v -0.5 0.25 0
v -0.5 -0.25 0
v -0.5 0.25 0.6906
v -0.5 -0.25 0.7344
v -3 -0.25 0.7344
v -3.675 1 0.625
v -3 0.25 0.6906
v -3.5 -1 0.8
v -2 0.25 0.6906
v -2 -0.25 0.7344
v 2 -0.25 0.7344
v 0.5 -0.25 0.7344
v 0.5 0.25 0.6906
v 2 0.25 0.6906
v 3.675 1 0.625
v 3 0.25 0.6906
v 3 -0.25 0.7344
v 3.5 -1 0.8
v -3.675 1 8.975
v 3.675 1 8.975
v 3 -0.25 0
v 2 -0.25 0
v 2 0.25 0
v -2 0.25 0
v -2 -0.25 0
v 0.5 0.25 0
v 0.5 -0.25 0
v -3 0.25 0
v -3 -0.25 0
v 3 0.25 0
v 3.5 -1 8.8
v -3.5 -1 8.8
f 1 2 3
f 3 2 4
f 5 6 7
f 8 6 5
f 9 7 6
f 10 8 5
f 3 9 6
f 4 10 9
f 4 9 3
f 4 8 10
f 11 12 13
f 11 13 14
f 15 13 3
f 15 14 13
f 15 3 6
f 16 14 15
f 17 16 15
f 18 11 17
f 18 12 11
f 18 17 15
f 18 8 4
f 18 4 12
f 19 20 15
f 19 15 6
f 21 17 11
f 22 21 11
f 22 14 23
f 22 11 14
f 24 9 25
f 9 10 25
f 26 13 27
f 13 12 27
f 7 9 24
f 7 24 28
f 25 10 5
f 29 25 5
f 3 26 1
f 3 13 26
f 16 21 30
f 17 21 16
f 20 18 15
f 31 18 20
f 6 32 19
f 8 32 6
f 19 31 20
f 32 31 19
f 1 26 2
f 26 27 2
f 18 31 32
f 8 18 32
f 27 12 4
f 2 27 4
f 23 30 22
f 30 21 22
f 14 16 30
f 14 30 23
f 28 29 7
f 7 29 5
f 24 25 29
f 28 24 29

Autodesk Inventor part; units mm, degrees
ref_plane "YZ Plane" through (0, 0, 0) normal (1, 0, 0) x (0, 1, 0)
ref_plane "XZ Plane" through (0, 0, 0) normal (0, 1, 0) x (-1, 0, 0)
ref_plane "XY Plane" through (0, 0, 0) normal (0, 0, 1) x (1, 0, 0)
sketch "Sketch2" plane through (0, 0, 0) normal (0, 1, 0) x (-1, 0, 0)
  line L0 (0, -0.1) -> (0, 1.3) projected
  line L1 (-4.8, 0) -> (3.6, 0) projected
  line L2 (-0.5, 0) -> (0.5, 0)
  line L3 (0.5, 0) -> (0.5, 1)
  line L4 (0.5, 1) -> (-0.5, 1)
  line L5 (-0.5, 1) -> (-0.5, 0)
  line L6 (2, 0) -> (3, 0)
  line L7 (3, 0) -> (3, 1)
  line L8 (3, 1) -> (2, 1)
  line L9 (2, 1) -> (2, 0)
  line L10 (-2, 0) -> (-3, 0)
  line L11 (-3, 0) -> (-3, 1)
  line L12 (-3, 1) -> (-2, 1)
  line L13 (-2, 1) -> (-2, 0)
  dimension "d0" = 6
  dimension "d1" = 1
  dimension "d2" = 1
extrude "Extrusion1" add sketch "Sketch2" along normal mid plane 0.5
sketch "Sketch3" plane through (0, 0, 0) normal (0, 1, 0) x (-1, 0, 0)
  line L0 (0, -1.18) -> (0, 15.34) projected
  line L1 (-0.5, 1) -> (0.5, 1) projected
  line L2 (-3.5, 8.8) -> (3.5, 8.8)
  line L3 (3.5, 8.8) -> (3.5, 0.8)
  line L4 (3.5, 0.8) -> (-3.5, 0.8)
  line L5 (-3.5, 0.8) -> (-3.5, 8.8)
  point P0 (0, 0)
  dimension "d5" = 0.2
  dimension "d6" = 8
  dimension "d7" = 7
extrude "Extrusion2" add sketch "Sketch3" along normal mid plane 2
draft "FaceDraft1" angle 5 pull direction (0, -1, 0) faces at (3.5, 0.3333, 6.1333) (-0.1667, 0.75, 0.8) (-3.5, -0.3333, 6.1333) (-1.1667, 0.3333, 8.8) fixed edges at (3.5, -1, 4.8) (0, -1, 0.8) (-3.5, -1, 4.8) (0, -1, 8.8)
properties part number "config - chip stand"
